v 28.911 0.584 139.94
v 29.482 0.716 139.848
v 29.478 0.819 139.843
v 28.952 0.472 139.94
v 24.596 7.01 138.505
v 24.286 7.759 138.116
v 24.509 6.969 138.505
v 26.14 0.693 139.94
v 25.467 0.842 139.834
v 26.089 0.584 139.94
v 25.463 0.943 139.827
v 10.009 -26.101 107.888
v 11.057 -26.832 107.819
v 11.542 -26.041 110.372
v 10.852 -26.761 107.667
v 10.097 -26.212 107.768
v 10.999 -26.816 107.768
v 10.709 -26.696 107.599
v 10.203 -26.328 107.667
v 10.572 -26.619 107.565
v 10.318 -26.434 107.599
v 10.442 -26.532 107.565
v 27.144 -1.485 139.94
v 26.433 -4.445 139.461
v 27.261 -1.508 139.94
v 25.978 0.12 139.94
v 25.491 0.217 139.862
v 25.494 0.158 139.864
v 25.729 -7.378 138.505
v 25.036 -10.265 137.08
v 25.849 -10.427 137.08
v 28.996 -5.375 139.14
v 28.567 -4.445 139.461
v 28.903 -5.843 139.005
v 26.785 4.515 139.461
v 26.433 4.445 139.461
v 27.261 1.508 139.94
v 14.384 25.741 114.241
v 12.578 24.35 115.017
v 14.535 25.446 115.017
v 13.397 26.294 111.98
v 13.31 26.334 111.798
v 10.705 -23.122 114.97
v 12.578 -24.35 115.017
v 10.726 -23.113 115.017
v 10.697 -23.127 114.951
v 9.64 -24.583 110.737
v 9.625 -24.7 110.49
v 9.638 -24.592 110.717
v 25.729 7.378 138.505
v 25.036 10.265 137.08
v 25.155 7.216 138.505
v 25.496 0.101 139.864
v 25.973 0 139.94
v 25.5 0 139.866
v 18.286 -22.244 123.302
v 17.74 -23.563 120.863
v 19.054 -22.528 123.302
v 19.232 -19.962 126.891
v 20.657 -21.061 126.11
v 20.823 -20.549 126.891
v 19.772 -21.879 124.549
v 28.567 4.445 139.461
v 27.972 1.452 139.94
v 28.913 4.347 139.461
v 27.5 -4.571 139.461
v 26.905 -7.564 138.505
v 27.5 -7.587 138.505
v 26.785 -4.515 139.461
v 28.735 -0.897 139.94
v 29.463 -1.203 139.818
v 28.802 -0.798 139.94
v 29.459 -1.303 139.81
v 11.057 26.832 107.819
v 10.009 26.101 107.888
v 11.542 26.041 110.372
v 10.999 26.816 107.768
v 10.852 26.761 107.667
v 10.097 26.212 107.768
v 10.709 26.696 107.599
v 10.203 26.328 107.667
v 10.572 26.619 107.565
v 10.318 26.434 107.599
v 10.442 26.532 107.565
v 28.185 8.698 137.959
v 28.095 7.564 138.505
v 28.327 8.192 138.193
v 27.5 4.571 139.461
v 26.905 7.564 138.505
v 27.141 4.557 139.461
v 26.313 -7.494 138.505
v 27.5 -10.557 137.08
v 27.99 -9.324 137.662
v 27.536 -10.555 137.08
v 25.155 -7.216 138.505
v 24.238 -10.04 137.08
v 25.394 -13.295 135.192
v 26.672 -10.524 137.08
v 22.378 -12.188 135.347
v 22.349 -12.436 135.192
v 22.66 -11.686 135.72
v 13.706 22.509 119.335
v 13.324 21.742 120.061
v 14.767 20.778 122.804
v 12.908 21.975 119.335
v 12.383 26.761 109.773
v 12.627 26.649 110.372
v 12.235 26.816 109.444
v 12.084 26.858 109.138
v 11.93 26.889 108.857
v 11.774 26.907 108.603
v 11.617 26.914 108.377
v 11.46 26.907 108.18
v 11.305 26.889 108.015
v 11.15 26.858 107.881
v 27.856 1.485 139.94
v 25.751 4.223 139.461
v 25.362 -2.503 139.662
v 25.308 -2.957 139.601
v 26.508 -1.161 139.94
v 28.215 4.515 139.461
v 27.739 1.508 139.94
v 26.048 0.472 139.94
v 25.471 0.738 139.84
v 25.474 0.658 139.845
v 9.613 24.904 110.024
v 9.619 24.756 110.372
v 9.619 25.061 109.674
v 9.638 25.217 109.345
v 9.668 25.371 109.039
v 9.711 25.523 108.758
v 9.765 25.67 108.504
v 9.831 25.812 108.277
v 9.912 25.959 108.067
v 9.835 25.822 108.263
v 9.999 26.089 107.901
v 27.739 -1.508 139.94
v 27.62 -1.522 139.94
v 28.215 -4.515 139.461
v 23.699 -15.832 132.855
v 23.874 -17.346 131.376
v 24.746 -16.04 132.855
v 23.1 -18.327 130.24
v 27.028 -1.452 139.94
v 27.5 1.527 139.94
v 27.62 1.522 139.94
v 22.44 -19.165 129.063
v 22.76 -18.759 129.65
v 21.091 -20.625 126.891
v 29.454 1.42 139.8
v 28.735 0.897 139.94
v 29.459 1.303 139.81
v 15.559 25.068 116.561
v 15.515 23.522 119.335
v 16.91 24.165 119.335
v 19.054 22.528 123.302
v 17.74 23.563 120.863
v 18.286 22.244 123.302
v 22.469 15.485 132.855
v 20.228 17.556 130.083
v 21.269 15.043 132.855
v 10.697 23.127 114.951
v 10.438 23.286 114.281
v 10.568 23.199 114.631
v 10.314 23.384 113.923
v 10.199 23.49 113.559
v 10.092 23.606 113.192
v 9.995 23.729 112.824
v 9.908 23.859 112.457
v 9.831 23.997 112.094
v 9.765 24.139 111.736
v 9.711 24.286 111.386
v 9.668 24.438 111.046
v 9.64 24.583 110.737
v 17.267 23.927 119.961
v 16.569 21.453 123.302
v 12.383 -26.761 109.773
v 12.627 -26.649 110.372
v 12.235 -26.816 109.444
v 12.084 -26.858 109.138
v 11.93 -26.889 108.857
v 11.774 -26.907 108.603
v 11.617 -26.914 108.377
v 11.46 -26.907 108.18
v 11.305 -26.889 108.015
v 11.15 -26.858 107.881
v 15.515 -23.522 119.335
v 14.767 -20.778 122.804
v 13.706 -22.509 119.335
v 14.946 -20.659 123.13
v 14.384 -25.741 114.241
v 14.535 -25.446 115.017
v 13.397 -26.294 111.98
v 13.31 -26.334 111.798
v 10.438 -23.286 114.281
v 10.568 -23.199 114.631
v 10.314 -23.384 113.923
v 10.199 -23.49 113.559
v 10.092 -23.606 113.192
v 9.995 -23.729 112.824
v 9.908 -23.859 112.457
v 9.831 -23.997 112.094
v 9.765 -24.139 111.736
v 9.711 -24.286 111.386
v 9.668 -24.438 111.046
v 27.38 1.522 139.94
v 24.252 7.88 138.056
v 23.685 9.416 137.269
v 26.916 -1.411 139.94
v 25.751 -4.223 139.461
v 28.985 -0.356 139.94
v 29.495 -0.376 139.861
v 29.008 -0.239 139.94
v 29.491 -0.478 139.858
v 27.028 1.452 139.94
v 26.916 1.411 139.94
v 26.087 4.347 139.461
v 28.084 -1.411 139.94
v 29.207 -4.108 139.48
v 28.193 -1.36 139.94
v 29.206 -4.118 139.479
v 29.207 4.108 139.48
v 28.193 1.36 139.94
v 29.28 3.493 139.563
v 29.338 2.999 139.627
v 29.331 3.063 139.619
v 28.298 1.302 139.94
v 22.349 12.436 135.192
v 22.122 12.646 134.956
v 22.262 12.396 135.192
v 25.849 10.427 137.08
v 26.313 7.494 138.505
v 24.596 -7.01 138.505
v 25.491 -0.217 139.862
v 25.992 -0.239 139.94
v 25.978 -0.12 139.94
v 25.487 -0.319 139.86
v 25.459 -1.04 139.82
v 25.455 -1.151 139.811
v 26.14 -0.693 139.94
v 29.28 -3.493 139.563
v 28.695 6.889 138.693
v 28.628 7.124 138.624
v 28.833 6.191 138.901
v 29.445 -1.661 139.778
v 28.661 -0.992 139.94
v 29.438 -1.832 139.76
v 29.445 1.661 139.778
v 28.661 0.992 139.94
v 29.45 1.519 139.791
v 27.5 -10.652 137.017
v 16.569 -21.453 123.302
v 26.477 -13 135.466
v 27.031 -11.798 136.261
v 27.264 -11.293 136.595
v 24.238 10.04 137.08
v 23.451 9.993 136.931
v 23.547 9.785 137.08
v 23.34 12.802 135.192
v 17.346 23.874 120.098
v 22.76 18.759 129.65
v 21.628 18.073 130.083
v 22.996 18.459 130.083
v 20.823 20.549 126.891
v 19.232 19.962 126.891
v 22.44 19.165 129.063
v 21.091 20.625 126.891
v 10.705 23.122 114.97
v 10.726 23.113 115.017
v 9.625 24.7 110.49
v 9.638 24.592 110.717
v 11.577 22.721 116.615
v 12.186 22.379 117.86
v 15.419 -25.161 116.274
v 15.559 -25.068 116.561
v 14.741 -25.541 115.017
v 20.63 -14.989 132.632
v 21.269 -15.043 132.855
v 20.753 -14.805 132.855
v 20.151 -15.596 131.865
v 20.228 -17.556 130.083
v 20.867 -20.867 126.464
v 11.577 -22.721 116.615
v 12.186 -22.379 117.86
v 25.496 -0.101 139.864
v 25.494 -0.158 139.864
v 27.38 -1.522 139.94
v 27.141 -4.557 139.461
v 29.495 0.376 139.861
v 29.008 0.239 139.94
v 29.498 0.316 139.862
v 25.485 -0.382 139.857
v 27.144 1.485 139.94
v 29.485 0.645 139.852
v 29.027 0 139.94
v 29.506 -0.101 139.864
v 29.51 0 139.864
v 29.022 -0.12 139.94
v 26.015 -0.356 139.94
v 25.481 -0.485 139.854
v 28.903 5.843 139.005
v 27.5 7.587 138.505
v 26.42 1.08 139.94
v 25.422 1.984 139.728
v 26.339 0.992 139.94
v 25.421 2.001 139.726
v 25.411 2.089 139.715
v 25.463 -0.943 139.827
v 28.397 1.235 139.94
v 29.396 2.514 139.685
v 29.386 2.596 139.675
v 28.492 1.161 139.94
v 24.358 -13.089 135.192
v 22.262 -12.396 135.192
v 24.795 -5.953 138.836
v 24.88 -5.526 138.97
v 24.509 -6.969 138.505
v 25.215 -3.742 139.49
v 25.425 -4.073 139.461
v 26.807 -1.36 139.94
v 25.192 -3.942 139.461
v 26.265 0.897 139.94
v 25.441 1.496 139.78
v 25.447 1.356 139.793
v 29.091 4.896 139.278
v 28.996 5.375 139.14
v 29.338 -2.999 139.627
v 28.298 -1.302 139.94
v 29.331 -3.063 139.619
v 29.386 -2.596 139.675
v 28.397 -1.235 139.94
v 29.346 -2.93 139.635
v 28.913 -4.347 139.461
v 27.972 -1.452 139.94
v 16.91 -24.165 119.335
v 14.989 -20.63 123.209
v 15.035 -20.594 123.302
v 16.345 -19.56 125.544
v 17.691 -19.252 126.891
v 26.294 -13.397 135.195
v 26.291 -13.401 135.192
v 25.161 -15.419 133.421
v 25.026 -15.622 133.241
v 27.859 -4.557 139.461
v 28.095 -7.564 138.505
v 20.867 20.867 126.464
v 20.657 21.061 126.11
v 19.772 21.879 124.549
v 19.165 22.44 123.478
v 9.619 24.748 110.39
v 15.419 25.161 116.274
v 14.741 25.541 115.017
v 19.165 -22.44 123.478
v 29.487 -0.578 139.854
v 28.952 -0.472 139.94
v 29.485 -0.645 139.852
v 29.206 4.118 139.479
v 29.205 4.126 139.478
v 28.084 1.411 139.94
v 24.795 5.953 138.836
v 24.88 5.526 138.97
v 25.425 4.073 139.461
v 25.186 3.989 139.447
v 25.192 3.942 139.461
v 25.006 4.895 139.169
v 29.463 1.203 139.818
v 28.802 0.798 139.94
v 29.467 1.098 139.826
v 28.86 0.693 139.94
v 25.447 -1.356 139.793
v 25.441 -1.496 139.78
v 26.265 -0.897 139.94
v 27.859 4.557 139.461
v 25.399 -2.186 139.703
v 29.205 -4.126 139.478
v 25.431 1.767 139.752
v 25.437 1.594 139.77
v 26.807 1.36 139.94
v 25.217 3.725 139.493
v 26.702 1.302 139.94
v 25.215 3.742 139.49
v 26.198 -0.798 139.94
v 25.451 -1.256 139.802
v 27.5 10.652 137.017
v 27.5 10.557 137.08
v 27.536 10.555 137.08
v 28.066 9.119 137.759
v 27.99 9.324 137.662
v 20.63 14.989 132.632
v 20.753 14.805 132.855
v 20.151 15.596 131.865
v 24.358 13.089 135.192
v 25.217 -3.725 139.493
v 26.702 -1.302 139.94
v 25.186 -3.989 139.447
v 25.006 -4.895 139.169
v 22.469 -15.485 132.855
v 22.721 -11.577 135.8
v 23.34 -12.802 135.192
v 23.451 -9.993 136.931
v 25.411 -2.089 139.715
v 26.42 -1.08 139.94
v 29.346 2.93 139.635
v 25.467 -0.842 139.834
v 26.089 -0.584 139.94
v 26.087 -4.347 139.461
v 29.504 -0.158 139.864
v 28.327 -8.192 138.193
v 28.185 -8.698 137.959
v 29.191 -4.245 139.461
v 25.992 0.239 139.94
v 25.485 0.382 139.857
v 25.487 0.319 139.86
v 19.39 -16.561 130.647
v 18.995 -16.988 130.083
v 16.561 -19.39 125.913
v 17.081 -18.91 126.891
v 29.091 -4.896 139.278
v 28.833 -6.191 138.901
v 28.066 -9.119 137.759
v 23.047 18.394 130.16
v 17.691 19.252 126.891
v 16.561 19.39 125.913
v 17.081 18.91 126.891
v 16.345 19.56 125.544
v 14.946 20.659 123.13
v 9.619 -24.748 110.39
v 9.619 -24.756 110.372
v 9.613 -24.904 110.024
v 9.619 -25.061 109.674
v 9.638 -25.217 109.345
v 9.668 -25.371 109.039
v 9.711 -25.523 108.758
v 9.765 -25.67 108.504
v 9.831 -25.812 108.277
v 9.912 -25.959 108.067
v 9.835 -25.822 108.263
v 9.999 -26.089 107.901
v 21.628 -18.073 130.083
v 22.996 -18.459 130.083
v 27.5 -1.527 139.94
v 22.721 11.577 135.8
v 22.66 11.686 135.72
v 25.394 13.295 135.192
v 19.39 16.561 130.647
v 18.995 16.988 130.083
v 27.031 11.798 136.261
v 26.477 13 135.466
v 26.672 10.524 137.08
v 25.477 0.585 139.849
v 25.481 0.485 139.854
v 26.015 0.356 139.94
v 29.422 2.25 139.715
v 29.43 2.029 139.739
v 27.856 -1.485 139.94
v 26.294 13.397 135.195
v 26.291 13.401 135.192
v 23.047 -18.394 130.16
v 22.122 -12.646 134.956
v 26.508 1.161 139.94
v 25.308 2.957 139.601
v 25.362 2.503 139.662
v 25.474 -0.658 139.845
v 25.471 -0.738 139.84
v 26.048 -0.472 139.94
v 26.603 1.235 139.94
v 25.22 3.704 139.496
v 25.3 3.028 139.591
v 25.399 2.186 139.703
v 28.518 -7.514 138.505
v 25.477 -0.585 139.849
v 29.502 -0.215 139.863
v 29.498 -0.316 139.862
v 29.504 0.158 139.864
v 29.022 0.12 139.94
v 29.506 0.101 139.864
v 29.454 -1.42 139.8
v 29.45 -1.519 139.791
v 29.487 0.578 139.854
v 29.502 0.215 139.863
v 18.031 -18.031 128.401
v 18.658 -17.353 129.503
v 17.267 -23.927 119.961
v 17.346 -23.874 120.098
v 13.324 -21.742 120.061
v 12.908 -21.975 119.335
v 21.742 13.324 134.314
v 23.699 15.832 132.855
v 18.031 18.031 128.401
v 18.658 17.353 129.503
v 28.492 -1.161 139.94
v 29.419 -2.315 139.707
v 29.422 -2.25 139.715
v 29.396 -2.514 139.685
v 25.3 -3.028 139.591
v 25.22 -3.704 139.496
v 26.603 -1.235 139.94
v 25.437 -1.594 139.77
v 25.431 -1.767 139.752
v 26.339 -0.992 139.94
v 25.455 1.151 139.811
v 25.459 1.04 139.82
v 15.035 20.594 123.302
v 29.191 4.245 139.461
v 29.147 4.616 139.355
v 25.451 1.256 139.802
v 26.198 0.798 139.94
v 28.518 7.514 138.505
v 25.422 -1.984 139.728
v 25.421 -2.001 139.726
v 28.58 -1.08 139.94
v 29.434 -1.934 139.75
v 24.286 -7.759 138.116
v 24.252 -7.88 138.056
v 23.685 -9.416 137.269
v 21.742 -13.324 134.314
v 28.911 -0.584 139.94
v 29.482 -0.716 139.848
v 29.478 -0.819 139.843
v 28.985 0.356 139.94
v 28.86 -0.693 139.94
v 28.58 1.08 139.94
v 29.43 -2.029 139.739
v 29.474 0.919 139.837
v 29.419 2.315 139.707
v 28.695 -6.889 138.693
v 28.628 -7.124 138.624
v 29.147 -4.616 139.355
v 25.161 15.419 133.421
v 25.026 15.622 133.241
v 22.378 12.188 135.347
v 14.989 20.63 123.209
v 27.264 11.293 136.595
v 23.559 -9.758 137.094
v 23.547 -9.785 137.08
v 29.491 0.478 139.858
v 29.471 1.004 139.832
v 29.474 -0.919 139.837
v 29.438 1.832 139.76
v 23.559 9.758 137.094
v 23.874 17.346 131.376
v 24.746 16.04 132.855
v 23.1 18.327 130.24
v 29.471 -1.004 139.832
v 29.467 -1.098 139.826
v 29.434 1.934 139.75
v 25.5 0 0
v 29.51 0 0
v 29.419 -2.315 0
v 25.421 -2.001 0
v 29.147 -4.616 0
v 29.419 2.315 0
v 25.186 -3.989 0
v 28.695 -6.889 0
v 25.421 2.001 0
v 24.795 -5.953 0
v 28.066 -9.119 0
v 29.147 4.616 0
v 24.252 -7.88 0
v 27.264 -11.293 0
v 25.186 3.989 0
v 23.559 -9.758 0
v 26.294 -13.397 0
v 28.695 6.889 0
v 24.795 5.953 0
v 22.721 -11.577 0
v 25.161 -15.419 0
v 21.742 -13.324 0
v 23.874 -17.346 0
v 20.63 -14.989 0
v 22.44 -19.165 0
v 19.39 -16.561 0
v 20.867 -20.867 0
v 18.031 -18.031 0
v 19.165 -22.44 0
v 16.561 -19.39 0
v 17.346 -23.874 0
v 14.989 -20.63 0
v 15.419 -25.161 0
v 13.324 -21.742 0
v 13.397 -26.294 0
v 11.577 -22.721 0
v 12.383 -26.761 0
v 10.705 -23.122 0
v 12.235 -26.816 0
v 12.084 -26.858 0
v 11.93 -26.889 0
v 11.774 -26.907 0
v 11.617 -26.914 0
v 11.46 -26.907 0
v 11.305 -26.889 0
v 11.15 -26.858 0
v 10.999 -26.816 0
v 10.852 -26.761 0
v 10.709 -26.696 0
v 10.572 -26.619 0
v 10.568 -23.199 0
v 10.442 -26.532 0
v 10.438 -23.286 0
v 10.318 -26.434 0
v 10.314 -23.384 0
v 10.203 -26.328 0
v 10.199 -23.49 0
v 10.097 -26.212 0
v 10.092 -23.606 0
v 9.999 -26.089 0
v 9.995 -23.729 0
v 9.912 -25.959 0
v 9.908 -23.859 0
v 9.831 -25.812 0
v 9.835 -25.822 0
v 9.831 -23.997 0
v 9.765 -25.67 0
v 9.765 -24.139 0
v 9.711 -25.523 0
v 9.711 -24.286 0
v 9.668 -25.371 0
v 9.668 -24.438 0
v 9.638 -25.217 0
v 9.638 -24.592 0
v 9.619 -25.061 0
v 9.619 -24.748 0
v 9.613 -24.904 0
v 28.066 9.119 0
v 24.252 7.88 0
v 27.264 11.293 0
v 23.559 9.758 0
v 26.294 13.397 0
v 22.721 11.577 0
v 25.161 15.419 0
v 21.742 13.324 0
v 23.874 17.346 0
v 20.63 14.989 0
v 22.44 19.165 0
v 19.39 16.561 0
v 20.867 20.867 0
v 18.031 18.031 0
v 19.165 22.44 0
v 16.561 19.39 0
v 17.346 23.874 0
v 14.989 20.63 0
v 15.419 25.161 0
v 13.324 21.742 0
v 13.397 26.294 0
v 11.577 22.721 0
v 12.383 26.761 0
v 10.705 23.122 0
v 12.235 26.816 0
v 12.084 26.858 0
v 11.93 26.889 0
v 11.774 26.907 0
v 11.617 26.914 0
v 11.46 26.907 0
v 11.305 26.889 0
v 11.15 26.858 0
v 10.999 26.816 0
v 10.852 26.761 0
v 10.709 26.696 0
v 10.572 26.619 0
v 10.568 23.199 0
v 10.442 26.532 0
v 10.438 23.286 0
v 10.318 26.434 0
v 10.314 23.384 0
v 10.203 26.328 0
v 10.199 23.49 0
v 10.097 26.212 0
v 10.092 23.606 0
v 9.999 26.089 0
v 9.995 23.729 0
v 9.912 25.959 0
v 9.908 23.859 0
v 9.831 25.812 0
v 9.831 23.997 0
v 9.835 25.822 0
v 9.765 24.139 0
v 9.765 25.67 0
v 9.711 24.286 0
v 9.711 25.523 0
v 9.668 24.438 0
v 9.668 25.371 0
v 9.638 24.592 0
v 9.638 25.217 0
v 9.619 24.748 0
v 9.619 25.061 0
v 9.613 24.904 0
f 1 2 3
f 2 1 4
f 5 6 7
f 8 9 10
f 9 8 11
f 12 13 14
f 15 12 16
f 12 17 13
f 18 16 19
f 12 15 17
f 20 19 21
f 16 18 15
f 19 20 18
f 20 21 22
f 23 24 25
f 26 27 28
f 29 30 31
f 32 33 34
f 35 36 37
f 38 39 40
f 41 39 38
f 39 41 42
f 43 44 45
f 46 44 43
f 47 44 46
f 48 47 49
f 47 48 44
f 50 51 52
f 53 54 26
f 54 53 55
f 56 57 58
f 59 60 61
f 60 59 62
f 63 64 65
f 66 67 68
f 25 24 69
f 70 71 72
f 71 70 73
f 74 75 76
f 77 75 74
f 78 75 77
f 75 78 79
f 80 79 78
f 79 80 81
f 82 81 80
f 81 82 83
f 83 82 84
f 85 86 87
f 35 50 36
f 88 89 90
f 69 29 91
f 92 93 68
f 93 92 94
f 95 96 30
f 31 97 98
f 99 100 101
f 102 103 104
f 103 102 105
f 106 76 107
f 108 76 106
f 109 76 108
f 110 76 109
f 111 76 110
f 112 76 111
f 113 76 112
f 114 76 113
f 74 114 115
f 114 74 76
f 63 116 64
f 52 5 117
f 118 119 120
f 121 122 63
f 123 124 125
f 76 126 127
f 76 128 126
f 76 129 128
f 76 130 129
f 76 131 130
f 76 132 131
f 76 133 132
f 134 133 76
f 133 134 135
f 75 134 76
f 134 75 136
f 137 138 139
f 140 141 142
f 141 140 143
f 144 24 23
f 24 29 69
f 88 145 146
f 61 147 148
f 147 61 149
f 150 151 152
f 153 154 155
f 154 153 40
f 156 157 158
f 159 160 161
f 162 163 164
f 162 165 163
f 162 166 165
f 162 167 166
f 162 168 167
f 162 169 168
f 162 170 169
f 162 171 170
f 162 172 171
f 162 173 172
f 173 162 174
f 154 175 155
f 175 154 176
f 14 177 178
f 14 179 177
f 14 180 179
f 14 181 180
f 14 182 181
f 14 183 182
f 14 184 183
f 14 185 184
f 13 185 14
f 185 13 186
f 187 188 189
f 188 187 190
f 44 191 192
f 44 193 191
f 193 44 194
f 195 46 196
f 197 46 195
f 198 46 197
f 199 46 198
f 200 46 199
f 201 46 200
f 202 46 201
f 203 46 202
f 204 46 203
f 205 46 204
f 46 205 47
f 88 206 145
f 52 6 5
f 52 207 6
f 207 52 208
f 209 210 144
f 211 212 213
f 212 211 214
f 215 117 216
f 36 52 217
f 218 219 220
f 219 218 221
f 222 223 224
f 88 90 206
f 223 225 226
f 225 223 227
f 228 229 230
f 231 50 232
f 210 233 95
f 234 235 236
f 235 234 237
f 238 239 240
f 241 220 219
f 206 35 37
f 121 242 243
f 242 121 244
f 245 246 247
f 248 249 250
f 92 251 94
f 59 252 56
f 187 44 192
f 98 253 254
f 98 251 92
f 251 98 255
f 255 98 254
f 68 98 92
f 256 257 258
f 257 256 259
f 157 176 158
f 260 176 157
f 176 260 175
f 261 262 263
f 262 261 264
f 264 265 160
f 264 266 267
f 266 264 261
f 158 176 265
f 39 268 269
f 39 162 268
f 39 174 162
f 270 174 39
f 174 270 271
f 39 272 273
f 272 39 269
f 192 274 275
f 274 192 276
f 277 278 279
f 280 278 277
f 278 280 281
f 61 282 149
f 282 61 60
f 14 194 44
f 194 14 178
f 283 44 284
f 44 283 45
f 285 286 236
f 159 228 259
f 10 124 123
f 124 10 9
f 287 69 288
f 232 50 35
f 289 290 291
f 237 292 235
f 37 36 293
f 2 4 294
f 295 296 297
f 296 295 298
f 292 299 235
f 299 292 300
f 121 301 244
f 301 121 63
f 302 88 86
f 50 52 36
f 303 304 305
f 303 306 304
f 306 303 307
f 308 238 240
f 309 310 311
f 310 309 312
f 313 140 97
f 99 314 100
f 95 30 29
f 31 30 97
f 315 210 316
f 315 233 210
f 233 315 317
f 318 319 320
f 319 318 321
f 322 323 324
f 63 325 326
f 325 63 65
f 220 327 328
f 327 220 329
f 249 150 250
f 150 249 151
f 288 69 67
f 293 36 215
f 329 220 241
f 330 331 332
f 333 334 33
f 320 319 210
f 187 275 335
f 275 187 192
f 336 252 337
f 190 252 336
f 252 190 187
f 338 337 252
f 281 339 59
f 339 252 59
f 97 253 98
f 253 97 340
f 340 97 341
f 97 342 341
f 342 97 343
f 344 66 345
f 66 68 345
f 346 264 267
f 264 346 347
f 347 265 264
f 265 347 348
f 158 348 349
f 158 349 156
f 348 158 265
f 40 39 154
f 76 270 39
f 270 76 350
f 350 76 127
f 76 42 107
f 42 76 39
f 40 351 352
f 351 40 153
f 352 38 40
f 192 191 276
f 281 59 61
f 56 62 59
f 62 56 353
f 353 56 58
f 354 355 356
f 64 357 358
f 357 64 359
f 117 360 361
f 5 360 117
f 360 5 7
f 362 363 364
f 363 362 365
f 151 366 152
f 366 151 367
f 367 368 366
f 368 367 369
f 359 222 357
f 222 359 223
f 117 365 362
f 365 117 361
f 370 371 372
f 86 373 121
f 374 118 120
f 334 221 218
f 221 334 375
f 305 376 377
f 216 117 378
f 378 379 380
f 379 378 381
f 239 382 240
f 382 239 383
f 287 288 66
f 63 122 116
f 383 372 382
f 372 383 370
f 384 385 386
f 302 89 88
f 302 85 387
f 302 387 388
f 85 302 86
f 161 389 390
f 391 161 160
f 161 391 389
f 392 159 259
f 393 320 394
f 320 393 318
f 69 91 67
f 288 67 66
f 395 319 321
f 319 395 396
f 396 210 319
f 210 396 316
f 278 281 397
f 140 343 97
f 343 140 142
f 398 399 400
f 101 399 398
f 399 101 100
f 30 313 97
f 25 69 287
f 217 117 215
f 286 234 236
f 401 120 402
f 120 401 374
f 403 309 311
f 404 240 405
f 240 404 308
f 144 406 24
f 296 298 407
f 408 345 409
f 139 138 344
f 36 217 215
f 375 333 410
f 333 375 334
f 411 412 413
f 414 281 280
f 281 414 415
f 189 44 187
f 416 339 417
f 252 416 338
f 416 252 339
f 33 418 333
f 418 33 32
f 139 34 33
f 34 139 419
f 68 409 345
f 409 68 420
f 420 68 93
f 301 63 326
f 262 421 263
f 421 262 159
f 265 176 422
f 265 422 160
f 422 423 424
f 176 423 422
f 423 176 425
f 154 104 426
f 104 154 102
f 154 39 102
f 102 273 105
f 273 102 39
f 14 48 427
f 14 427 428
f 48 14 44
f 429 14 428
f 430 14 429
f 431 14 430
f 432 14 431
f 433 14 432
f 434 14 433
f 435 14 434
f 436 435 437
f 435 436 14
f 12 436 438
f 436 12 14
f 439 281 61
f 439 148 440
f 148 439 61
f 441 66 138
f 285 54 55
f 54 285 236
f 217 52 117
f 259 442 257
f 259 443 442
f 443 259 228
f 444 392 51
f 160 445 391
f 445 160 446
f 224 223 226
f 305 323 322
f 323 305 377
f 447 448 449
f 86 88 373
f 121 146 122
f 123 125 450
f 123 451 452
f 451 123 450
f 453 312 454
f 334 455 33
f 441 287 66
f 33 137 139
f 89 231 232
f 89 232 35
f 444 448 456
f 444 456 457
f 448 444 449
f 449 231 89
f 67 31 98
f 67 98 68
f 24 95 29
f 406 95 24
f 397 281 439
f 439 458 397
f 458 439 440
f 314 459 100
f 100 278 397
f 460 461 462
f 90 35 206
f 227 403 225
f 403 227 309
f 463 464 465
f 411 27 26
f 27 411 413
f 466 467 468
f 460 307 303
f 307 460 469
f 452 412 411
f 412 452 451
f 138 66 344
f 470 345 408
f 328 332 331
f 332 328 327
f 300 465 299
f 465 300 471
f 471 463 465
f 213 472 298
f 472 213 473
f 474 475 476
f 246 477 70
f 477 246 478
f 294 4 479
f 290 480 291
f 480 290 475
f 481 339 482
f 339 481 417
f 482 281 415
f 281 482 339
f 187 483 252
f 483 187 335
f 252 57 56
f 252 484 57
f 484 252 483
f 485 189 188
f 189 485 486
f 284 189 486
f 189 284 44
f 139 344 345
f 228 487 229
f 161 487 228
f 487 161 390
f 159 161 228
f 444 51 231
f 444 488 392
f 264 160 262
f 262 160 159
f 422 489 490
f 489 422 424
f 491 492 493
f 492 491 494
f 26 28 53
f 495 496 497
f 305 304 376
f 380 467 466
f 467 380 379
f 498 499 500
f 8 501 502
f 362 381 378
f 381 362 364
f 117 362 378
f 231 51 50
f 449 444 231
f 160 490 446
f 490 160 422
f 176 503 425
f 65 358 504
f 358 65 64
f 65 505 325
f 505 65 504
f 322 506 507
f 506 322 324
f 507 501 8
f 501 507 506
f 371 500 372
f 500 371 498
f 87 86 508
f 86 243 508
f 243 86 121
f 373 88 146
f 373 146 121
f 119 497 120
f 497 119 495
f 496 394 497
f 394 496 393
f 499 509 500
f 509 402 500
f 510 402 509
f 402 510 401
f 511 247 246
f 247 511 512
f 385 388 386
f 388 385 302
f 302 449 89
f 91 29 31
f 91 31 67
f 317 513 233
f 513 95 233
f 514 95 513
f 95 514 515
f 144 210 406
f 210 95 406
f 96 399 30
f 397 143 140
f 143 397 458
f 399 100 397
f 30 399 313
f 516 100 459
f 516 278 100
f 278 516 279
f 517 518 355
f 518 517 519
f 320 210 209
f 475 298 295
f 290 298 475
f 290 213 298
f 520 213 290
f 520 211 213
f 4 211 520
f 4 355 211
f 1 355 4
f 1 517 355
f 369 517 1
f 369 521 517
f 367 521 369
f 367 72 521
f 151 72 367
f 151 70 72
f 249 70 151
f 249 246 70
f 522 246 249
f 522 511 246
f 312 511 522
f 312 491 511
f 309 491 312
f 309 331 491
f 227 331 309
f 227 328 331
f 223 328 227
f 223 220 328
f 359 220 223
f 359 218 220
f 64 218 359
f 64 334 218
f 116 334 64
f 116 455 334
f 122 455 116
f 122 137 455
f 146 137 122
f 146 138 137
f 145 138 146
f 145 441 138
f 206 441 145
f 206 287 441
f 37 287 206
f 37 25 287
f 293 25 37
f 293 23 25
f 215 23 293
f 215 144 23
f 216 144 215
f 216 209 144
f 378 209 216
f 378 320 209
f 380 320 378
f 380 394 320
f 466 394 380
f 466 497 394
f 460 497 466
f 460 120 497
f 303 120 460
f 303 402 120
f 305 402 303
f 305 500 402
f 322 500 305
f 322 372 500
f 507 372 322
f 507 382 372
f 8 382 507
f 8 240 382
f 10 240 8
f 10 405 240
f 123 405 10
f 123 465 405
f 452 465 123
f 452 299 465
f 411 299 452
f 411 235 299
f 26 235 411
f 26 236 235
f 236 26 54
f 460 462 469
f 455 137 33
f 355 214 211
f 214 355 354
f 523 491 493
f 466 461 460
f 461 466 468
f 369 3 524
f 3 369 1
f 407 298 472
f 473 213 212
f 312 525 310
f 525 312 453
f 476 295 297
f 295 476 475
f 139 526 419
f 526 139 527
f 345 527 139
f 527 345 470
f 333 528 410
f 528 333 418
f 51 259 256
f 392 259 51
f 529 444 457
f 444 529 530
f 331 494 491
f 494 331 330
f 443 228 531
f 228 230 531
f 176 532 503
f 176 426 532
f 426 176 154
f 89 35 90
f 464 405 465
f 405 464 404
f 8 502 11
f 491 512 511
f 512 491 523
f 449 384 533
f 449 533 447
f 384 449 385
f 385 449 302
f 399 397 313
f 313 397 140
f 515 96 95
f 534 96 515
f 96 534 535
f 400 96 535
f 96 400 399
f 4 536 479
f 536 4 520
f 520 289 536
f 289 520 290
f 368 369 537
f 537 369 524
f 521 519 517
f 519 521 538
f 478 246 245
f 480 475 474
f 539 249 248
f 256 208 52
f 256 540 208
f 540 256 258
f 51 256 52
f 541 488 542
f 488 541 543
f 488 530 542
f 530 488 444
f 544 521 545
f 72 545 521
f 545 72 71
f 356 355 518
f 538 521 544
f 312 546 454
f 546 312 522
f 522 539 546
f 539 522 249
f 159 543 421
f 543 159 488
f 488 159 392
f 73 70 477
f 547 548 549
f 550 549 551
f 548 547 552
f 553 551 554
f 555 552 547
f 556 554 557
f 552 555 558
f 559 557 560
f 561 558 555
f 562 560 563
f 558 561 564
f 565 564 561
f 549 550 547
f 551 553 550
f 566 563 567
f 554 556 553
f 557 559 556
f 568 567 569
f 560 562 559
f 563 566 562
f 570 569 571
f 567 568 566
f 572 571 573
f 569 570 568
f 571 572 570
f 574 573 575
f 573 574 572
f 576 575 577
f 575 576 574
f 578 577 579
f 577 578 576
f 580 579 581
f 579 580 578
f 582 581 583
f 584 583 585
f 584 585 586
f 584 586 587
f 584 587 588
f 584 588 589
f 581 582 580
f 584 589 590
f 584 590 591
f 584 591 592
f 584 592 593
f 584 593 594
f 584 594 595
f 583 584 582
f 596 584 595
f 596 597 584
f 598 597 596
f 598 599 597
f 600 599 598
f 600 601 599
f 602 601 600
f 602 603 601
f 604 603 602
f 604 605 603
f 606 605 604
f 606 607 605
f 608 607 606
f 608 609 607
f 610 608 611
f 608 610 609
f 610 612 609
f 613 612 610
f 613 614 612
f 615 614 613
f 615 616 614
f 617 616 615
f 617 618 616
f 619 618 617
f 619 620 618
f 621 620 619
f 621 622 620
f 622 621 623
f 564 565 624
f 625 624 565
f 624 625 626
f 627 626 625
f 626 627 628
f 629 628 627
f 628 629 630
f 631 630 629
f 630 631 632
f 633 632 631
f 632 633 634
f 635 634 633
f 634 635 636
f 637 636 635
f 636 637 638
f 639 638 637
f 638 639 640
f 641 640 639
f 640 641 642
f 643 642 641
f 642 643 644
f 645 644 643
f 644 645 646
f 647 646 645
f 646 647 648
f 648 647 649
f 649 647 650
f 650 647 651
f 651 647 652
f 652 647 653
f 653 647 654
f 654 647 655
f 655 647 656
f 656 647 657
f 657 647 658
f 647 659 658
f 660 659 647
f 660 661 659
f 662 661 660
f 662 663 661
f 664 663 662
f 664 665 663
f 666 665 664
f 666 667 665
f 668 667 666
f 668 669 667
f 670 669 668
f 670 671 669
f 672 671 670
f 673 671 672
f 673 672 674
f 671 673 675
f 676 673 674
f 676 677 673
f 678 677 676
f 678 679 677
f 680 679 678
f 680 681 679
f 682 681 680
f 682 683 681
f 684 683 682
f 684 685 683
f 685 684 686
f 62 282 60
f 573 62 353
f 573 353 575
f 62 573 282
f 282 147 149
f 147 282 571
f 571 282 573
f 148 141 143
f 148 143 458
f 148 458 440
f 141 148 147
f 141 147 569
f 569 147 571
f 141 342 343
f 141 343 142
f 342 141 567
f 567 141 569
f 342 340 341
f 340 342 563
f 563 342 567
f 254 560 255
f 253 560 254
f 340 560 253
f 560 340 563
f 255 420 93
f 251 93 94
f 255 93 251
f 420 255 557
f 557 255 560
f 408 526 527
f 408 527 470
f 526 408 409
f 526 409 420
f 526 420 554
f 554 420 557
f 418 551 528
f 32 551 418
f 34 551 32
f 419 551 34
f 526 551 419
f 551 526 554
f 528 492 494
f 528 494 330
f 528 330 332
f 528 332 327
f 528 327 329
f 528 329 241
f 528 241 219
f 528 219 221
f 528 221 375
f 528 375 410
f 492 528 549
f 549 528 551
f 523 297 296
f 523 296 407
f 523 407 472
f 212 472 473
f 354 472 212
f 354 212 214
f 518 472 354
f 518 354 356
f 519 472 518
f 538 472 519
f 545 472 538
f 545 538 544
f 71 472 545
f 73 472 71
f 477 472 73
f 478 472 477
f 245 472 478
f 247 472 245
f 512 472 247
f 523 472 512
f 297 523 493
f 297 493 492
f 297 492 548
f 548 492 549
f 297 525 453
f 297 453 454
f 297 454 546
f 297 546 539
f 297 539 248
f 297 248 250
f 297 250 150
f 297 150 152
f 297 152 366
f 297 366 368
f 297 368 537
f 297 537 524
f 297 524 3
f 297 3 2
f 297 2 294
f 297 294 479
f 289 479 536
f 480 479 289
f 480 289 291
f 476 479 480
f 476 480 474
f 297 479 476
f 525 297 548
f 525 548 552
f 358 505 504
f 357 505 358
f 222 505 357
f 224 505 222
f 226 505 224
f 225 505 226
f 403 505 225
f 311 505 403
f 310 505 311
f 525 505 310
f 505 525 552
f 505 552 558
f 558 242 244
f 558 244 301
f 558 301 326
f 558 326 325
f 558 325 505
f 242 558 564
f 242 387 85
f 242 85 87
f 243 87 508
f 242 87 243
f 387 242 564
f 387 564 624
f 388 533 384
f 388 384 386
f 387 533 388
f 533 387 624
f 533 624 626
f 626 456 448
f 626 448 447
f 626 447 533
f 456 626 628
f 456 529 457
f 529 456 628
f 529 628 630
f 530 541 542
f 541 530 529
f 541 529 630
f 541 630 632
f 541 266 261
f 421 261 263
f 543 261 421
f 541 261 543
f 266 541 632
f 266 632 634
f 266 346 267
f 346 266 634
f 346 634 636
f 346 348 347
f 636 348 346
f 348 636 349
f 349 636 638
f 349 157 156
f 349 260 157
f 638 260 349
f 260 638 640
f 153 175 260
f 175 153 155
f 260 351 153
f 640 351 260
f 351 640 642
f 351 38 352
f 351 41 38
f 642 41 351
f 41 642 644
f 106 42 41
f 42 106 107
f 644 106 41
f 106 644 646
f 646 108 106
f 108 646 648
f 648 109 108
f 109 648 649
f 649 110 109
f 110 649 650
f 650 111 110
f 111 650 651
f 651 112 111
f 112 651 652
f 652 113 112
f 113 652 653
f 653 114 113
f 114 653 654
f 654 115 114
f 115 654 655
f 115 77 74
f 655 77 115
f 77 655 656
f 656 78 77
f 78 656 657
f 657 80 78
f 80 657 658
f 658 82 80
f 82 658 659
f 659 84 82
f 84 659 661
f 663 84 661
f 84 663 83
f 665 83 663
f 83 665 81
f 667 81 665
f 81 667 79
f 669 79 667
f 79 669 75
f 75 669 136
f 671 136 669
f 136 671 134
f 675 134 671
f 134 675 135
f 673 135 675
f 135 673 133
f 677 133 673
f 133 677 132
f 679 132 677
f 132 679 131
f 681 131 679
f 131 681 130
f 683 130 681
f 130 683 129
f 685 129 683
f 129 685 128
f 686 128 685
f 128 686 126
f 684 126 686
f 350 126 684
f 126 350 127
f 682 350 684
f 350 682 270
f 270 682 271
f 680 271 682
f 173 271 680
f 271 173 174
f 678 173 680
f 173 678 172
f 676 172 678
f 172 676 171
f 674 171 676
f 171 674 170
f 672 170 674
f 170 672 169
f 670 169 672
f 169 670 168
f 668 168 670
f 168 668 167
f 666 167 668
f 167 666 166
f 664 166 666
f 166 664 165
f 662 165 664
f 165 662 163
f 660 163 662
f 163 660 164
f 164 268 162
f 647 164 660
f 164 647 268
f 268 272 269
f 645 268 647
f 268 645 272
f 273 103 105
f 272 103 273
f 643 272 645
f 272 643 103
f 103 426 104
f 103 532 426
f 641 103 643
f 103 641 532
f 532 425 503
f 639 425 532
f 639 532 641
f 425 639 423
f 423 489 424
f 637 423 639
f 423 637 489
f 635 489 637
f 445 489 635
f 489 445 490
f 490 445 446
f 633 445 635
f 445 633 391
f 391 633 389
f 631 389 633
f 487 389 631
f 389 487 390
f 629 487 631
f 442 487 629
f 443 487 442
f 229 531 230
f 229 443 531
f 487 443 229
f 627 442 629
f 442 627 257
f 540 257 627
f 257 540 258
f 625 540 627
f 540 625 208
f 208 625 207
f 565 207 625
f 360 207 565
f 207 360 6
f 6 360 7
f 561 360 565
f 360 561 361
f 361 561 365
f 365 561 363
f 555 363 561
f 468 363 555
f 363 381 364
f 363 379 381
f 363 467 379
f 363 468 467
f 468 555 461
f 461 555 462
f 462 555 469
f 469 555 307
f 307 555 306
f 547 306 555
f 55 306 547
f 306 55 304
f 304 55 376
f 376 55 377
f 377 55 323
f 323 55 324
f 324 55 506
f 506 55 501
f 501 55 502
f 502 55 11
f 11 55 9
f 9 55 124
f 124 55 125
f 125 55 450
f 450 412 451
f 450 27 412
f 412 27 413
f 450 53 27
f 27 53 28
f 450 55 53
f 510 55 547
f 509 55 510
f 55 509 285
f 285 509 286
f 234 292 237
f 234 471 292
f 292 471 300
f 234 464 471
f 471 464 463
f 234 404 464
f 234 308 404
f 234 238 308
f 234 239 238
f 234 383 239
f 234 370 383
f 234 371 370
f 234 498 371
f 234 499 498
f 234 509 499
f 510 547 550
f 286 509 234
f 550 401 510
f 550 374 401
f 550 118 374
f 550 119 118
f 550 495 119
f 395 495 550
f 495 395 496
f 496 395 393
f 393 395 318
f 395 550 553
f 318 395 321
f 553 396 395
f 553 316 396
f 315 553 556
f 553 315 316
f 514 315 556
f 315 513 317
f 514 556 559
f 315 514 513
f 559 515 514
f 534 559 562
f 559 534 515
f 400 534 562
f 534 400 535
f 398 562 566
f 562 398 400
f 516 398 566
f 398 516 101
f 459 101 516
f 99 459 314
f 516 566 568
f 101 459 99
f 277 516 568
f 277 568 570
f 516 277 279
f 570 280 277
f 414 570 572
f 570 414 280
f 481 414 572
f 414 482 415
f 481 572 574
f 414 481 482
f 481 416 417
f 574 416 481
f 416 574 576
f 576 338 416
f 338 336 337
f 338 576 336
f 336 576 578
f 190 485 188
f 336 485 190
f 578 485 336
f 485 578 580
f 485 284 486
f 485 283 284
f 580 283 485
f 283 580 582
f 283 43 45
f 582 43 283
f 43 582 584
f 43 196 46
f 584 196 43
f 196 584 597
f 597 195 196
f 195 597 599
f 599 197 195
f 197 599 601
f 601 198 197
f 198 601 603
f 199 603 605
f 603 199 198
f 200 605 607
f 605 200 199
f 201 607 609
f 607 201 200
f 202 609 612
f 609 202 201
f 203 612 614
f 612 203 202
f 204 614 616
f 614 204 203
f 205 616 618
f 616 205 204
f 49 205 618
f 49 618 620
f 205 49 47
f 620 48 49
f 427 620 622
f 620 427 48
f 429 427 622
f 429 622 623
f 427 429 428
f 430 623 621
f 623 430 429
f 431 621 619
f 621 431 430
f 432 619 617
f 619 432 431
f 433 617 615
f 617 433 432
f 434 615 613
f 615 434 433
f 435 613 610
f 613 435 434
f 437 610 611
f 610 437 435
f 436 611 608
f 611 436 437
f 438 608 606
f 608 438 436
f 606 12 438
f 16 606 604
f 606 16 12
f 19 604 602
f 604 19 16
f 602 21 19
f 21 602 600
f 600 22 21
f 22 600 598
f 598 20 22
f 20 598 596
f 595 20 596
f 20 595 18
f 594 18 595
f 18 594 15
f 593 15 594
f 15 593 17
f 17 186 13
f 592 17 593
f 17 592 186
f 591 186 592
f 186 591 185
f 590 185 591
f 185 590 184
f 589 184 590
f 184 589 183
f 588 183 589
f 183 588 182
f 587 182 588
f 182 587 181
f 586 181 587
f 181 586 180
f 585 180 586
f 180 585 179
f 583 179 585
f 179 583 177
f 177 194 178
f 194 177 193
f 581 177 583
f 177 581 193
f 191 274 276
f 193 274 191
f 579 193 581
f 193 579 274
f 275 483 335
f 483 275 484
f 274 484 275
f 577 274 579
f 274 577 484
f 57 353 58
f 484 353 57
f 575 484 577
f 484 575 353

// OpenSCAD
$fn = 80;

module wedge(theta, r) {
    rotate(-theta/2)
    polygon(r * [
        [0, 0],
        [1, 0],
        [cos(theta), sin(theta)]
    ])
        ;
}

roc = 27.5;
height = 140;
sphere_vscale = 2;

intersection() {
    linear_extrude(height)
    minkowski() {
        intersection() {
            difference() {
                circle(r=roc + 0.01)
                    ;
                circle(r=roc)
                    ;
            }
                ;
            wedge(130, roc * 10)
                ;
        }
            ;
        circle(r=2)
            ;
    }
        ;
    union() {
        translate([roc, 0, height - roc * sqrt(2) * sphere_vscale])
        scale([1, 1, sphere_vscale])
        sphere(r=roc * sqrt(2))
            ;
        translate([0, -roc * 50, 0])
        cube([roc * 100, roc * 100, height - roc * sqrt(2)])
            ;
    }
}
